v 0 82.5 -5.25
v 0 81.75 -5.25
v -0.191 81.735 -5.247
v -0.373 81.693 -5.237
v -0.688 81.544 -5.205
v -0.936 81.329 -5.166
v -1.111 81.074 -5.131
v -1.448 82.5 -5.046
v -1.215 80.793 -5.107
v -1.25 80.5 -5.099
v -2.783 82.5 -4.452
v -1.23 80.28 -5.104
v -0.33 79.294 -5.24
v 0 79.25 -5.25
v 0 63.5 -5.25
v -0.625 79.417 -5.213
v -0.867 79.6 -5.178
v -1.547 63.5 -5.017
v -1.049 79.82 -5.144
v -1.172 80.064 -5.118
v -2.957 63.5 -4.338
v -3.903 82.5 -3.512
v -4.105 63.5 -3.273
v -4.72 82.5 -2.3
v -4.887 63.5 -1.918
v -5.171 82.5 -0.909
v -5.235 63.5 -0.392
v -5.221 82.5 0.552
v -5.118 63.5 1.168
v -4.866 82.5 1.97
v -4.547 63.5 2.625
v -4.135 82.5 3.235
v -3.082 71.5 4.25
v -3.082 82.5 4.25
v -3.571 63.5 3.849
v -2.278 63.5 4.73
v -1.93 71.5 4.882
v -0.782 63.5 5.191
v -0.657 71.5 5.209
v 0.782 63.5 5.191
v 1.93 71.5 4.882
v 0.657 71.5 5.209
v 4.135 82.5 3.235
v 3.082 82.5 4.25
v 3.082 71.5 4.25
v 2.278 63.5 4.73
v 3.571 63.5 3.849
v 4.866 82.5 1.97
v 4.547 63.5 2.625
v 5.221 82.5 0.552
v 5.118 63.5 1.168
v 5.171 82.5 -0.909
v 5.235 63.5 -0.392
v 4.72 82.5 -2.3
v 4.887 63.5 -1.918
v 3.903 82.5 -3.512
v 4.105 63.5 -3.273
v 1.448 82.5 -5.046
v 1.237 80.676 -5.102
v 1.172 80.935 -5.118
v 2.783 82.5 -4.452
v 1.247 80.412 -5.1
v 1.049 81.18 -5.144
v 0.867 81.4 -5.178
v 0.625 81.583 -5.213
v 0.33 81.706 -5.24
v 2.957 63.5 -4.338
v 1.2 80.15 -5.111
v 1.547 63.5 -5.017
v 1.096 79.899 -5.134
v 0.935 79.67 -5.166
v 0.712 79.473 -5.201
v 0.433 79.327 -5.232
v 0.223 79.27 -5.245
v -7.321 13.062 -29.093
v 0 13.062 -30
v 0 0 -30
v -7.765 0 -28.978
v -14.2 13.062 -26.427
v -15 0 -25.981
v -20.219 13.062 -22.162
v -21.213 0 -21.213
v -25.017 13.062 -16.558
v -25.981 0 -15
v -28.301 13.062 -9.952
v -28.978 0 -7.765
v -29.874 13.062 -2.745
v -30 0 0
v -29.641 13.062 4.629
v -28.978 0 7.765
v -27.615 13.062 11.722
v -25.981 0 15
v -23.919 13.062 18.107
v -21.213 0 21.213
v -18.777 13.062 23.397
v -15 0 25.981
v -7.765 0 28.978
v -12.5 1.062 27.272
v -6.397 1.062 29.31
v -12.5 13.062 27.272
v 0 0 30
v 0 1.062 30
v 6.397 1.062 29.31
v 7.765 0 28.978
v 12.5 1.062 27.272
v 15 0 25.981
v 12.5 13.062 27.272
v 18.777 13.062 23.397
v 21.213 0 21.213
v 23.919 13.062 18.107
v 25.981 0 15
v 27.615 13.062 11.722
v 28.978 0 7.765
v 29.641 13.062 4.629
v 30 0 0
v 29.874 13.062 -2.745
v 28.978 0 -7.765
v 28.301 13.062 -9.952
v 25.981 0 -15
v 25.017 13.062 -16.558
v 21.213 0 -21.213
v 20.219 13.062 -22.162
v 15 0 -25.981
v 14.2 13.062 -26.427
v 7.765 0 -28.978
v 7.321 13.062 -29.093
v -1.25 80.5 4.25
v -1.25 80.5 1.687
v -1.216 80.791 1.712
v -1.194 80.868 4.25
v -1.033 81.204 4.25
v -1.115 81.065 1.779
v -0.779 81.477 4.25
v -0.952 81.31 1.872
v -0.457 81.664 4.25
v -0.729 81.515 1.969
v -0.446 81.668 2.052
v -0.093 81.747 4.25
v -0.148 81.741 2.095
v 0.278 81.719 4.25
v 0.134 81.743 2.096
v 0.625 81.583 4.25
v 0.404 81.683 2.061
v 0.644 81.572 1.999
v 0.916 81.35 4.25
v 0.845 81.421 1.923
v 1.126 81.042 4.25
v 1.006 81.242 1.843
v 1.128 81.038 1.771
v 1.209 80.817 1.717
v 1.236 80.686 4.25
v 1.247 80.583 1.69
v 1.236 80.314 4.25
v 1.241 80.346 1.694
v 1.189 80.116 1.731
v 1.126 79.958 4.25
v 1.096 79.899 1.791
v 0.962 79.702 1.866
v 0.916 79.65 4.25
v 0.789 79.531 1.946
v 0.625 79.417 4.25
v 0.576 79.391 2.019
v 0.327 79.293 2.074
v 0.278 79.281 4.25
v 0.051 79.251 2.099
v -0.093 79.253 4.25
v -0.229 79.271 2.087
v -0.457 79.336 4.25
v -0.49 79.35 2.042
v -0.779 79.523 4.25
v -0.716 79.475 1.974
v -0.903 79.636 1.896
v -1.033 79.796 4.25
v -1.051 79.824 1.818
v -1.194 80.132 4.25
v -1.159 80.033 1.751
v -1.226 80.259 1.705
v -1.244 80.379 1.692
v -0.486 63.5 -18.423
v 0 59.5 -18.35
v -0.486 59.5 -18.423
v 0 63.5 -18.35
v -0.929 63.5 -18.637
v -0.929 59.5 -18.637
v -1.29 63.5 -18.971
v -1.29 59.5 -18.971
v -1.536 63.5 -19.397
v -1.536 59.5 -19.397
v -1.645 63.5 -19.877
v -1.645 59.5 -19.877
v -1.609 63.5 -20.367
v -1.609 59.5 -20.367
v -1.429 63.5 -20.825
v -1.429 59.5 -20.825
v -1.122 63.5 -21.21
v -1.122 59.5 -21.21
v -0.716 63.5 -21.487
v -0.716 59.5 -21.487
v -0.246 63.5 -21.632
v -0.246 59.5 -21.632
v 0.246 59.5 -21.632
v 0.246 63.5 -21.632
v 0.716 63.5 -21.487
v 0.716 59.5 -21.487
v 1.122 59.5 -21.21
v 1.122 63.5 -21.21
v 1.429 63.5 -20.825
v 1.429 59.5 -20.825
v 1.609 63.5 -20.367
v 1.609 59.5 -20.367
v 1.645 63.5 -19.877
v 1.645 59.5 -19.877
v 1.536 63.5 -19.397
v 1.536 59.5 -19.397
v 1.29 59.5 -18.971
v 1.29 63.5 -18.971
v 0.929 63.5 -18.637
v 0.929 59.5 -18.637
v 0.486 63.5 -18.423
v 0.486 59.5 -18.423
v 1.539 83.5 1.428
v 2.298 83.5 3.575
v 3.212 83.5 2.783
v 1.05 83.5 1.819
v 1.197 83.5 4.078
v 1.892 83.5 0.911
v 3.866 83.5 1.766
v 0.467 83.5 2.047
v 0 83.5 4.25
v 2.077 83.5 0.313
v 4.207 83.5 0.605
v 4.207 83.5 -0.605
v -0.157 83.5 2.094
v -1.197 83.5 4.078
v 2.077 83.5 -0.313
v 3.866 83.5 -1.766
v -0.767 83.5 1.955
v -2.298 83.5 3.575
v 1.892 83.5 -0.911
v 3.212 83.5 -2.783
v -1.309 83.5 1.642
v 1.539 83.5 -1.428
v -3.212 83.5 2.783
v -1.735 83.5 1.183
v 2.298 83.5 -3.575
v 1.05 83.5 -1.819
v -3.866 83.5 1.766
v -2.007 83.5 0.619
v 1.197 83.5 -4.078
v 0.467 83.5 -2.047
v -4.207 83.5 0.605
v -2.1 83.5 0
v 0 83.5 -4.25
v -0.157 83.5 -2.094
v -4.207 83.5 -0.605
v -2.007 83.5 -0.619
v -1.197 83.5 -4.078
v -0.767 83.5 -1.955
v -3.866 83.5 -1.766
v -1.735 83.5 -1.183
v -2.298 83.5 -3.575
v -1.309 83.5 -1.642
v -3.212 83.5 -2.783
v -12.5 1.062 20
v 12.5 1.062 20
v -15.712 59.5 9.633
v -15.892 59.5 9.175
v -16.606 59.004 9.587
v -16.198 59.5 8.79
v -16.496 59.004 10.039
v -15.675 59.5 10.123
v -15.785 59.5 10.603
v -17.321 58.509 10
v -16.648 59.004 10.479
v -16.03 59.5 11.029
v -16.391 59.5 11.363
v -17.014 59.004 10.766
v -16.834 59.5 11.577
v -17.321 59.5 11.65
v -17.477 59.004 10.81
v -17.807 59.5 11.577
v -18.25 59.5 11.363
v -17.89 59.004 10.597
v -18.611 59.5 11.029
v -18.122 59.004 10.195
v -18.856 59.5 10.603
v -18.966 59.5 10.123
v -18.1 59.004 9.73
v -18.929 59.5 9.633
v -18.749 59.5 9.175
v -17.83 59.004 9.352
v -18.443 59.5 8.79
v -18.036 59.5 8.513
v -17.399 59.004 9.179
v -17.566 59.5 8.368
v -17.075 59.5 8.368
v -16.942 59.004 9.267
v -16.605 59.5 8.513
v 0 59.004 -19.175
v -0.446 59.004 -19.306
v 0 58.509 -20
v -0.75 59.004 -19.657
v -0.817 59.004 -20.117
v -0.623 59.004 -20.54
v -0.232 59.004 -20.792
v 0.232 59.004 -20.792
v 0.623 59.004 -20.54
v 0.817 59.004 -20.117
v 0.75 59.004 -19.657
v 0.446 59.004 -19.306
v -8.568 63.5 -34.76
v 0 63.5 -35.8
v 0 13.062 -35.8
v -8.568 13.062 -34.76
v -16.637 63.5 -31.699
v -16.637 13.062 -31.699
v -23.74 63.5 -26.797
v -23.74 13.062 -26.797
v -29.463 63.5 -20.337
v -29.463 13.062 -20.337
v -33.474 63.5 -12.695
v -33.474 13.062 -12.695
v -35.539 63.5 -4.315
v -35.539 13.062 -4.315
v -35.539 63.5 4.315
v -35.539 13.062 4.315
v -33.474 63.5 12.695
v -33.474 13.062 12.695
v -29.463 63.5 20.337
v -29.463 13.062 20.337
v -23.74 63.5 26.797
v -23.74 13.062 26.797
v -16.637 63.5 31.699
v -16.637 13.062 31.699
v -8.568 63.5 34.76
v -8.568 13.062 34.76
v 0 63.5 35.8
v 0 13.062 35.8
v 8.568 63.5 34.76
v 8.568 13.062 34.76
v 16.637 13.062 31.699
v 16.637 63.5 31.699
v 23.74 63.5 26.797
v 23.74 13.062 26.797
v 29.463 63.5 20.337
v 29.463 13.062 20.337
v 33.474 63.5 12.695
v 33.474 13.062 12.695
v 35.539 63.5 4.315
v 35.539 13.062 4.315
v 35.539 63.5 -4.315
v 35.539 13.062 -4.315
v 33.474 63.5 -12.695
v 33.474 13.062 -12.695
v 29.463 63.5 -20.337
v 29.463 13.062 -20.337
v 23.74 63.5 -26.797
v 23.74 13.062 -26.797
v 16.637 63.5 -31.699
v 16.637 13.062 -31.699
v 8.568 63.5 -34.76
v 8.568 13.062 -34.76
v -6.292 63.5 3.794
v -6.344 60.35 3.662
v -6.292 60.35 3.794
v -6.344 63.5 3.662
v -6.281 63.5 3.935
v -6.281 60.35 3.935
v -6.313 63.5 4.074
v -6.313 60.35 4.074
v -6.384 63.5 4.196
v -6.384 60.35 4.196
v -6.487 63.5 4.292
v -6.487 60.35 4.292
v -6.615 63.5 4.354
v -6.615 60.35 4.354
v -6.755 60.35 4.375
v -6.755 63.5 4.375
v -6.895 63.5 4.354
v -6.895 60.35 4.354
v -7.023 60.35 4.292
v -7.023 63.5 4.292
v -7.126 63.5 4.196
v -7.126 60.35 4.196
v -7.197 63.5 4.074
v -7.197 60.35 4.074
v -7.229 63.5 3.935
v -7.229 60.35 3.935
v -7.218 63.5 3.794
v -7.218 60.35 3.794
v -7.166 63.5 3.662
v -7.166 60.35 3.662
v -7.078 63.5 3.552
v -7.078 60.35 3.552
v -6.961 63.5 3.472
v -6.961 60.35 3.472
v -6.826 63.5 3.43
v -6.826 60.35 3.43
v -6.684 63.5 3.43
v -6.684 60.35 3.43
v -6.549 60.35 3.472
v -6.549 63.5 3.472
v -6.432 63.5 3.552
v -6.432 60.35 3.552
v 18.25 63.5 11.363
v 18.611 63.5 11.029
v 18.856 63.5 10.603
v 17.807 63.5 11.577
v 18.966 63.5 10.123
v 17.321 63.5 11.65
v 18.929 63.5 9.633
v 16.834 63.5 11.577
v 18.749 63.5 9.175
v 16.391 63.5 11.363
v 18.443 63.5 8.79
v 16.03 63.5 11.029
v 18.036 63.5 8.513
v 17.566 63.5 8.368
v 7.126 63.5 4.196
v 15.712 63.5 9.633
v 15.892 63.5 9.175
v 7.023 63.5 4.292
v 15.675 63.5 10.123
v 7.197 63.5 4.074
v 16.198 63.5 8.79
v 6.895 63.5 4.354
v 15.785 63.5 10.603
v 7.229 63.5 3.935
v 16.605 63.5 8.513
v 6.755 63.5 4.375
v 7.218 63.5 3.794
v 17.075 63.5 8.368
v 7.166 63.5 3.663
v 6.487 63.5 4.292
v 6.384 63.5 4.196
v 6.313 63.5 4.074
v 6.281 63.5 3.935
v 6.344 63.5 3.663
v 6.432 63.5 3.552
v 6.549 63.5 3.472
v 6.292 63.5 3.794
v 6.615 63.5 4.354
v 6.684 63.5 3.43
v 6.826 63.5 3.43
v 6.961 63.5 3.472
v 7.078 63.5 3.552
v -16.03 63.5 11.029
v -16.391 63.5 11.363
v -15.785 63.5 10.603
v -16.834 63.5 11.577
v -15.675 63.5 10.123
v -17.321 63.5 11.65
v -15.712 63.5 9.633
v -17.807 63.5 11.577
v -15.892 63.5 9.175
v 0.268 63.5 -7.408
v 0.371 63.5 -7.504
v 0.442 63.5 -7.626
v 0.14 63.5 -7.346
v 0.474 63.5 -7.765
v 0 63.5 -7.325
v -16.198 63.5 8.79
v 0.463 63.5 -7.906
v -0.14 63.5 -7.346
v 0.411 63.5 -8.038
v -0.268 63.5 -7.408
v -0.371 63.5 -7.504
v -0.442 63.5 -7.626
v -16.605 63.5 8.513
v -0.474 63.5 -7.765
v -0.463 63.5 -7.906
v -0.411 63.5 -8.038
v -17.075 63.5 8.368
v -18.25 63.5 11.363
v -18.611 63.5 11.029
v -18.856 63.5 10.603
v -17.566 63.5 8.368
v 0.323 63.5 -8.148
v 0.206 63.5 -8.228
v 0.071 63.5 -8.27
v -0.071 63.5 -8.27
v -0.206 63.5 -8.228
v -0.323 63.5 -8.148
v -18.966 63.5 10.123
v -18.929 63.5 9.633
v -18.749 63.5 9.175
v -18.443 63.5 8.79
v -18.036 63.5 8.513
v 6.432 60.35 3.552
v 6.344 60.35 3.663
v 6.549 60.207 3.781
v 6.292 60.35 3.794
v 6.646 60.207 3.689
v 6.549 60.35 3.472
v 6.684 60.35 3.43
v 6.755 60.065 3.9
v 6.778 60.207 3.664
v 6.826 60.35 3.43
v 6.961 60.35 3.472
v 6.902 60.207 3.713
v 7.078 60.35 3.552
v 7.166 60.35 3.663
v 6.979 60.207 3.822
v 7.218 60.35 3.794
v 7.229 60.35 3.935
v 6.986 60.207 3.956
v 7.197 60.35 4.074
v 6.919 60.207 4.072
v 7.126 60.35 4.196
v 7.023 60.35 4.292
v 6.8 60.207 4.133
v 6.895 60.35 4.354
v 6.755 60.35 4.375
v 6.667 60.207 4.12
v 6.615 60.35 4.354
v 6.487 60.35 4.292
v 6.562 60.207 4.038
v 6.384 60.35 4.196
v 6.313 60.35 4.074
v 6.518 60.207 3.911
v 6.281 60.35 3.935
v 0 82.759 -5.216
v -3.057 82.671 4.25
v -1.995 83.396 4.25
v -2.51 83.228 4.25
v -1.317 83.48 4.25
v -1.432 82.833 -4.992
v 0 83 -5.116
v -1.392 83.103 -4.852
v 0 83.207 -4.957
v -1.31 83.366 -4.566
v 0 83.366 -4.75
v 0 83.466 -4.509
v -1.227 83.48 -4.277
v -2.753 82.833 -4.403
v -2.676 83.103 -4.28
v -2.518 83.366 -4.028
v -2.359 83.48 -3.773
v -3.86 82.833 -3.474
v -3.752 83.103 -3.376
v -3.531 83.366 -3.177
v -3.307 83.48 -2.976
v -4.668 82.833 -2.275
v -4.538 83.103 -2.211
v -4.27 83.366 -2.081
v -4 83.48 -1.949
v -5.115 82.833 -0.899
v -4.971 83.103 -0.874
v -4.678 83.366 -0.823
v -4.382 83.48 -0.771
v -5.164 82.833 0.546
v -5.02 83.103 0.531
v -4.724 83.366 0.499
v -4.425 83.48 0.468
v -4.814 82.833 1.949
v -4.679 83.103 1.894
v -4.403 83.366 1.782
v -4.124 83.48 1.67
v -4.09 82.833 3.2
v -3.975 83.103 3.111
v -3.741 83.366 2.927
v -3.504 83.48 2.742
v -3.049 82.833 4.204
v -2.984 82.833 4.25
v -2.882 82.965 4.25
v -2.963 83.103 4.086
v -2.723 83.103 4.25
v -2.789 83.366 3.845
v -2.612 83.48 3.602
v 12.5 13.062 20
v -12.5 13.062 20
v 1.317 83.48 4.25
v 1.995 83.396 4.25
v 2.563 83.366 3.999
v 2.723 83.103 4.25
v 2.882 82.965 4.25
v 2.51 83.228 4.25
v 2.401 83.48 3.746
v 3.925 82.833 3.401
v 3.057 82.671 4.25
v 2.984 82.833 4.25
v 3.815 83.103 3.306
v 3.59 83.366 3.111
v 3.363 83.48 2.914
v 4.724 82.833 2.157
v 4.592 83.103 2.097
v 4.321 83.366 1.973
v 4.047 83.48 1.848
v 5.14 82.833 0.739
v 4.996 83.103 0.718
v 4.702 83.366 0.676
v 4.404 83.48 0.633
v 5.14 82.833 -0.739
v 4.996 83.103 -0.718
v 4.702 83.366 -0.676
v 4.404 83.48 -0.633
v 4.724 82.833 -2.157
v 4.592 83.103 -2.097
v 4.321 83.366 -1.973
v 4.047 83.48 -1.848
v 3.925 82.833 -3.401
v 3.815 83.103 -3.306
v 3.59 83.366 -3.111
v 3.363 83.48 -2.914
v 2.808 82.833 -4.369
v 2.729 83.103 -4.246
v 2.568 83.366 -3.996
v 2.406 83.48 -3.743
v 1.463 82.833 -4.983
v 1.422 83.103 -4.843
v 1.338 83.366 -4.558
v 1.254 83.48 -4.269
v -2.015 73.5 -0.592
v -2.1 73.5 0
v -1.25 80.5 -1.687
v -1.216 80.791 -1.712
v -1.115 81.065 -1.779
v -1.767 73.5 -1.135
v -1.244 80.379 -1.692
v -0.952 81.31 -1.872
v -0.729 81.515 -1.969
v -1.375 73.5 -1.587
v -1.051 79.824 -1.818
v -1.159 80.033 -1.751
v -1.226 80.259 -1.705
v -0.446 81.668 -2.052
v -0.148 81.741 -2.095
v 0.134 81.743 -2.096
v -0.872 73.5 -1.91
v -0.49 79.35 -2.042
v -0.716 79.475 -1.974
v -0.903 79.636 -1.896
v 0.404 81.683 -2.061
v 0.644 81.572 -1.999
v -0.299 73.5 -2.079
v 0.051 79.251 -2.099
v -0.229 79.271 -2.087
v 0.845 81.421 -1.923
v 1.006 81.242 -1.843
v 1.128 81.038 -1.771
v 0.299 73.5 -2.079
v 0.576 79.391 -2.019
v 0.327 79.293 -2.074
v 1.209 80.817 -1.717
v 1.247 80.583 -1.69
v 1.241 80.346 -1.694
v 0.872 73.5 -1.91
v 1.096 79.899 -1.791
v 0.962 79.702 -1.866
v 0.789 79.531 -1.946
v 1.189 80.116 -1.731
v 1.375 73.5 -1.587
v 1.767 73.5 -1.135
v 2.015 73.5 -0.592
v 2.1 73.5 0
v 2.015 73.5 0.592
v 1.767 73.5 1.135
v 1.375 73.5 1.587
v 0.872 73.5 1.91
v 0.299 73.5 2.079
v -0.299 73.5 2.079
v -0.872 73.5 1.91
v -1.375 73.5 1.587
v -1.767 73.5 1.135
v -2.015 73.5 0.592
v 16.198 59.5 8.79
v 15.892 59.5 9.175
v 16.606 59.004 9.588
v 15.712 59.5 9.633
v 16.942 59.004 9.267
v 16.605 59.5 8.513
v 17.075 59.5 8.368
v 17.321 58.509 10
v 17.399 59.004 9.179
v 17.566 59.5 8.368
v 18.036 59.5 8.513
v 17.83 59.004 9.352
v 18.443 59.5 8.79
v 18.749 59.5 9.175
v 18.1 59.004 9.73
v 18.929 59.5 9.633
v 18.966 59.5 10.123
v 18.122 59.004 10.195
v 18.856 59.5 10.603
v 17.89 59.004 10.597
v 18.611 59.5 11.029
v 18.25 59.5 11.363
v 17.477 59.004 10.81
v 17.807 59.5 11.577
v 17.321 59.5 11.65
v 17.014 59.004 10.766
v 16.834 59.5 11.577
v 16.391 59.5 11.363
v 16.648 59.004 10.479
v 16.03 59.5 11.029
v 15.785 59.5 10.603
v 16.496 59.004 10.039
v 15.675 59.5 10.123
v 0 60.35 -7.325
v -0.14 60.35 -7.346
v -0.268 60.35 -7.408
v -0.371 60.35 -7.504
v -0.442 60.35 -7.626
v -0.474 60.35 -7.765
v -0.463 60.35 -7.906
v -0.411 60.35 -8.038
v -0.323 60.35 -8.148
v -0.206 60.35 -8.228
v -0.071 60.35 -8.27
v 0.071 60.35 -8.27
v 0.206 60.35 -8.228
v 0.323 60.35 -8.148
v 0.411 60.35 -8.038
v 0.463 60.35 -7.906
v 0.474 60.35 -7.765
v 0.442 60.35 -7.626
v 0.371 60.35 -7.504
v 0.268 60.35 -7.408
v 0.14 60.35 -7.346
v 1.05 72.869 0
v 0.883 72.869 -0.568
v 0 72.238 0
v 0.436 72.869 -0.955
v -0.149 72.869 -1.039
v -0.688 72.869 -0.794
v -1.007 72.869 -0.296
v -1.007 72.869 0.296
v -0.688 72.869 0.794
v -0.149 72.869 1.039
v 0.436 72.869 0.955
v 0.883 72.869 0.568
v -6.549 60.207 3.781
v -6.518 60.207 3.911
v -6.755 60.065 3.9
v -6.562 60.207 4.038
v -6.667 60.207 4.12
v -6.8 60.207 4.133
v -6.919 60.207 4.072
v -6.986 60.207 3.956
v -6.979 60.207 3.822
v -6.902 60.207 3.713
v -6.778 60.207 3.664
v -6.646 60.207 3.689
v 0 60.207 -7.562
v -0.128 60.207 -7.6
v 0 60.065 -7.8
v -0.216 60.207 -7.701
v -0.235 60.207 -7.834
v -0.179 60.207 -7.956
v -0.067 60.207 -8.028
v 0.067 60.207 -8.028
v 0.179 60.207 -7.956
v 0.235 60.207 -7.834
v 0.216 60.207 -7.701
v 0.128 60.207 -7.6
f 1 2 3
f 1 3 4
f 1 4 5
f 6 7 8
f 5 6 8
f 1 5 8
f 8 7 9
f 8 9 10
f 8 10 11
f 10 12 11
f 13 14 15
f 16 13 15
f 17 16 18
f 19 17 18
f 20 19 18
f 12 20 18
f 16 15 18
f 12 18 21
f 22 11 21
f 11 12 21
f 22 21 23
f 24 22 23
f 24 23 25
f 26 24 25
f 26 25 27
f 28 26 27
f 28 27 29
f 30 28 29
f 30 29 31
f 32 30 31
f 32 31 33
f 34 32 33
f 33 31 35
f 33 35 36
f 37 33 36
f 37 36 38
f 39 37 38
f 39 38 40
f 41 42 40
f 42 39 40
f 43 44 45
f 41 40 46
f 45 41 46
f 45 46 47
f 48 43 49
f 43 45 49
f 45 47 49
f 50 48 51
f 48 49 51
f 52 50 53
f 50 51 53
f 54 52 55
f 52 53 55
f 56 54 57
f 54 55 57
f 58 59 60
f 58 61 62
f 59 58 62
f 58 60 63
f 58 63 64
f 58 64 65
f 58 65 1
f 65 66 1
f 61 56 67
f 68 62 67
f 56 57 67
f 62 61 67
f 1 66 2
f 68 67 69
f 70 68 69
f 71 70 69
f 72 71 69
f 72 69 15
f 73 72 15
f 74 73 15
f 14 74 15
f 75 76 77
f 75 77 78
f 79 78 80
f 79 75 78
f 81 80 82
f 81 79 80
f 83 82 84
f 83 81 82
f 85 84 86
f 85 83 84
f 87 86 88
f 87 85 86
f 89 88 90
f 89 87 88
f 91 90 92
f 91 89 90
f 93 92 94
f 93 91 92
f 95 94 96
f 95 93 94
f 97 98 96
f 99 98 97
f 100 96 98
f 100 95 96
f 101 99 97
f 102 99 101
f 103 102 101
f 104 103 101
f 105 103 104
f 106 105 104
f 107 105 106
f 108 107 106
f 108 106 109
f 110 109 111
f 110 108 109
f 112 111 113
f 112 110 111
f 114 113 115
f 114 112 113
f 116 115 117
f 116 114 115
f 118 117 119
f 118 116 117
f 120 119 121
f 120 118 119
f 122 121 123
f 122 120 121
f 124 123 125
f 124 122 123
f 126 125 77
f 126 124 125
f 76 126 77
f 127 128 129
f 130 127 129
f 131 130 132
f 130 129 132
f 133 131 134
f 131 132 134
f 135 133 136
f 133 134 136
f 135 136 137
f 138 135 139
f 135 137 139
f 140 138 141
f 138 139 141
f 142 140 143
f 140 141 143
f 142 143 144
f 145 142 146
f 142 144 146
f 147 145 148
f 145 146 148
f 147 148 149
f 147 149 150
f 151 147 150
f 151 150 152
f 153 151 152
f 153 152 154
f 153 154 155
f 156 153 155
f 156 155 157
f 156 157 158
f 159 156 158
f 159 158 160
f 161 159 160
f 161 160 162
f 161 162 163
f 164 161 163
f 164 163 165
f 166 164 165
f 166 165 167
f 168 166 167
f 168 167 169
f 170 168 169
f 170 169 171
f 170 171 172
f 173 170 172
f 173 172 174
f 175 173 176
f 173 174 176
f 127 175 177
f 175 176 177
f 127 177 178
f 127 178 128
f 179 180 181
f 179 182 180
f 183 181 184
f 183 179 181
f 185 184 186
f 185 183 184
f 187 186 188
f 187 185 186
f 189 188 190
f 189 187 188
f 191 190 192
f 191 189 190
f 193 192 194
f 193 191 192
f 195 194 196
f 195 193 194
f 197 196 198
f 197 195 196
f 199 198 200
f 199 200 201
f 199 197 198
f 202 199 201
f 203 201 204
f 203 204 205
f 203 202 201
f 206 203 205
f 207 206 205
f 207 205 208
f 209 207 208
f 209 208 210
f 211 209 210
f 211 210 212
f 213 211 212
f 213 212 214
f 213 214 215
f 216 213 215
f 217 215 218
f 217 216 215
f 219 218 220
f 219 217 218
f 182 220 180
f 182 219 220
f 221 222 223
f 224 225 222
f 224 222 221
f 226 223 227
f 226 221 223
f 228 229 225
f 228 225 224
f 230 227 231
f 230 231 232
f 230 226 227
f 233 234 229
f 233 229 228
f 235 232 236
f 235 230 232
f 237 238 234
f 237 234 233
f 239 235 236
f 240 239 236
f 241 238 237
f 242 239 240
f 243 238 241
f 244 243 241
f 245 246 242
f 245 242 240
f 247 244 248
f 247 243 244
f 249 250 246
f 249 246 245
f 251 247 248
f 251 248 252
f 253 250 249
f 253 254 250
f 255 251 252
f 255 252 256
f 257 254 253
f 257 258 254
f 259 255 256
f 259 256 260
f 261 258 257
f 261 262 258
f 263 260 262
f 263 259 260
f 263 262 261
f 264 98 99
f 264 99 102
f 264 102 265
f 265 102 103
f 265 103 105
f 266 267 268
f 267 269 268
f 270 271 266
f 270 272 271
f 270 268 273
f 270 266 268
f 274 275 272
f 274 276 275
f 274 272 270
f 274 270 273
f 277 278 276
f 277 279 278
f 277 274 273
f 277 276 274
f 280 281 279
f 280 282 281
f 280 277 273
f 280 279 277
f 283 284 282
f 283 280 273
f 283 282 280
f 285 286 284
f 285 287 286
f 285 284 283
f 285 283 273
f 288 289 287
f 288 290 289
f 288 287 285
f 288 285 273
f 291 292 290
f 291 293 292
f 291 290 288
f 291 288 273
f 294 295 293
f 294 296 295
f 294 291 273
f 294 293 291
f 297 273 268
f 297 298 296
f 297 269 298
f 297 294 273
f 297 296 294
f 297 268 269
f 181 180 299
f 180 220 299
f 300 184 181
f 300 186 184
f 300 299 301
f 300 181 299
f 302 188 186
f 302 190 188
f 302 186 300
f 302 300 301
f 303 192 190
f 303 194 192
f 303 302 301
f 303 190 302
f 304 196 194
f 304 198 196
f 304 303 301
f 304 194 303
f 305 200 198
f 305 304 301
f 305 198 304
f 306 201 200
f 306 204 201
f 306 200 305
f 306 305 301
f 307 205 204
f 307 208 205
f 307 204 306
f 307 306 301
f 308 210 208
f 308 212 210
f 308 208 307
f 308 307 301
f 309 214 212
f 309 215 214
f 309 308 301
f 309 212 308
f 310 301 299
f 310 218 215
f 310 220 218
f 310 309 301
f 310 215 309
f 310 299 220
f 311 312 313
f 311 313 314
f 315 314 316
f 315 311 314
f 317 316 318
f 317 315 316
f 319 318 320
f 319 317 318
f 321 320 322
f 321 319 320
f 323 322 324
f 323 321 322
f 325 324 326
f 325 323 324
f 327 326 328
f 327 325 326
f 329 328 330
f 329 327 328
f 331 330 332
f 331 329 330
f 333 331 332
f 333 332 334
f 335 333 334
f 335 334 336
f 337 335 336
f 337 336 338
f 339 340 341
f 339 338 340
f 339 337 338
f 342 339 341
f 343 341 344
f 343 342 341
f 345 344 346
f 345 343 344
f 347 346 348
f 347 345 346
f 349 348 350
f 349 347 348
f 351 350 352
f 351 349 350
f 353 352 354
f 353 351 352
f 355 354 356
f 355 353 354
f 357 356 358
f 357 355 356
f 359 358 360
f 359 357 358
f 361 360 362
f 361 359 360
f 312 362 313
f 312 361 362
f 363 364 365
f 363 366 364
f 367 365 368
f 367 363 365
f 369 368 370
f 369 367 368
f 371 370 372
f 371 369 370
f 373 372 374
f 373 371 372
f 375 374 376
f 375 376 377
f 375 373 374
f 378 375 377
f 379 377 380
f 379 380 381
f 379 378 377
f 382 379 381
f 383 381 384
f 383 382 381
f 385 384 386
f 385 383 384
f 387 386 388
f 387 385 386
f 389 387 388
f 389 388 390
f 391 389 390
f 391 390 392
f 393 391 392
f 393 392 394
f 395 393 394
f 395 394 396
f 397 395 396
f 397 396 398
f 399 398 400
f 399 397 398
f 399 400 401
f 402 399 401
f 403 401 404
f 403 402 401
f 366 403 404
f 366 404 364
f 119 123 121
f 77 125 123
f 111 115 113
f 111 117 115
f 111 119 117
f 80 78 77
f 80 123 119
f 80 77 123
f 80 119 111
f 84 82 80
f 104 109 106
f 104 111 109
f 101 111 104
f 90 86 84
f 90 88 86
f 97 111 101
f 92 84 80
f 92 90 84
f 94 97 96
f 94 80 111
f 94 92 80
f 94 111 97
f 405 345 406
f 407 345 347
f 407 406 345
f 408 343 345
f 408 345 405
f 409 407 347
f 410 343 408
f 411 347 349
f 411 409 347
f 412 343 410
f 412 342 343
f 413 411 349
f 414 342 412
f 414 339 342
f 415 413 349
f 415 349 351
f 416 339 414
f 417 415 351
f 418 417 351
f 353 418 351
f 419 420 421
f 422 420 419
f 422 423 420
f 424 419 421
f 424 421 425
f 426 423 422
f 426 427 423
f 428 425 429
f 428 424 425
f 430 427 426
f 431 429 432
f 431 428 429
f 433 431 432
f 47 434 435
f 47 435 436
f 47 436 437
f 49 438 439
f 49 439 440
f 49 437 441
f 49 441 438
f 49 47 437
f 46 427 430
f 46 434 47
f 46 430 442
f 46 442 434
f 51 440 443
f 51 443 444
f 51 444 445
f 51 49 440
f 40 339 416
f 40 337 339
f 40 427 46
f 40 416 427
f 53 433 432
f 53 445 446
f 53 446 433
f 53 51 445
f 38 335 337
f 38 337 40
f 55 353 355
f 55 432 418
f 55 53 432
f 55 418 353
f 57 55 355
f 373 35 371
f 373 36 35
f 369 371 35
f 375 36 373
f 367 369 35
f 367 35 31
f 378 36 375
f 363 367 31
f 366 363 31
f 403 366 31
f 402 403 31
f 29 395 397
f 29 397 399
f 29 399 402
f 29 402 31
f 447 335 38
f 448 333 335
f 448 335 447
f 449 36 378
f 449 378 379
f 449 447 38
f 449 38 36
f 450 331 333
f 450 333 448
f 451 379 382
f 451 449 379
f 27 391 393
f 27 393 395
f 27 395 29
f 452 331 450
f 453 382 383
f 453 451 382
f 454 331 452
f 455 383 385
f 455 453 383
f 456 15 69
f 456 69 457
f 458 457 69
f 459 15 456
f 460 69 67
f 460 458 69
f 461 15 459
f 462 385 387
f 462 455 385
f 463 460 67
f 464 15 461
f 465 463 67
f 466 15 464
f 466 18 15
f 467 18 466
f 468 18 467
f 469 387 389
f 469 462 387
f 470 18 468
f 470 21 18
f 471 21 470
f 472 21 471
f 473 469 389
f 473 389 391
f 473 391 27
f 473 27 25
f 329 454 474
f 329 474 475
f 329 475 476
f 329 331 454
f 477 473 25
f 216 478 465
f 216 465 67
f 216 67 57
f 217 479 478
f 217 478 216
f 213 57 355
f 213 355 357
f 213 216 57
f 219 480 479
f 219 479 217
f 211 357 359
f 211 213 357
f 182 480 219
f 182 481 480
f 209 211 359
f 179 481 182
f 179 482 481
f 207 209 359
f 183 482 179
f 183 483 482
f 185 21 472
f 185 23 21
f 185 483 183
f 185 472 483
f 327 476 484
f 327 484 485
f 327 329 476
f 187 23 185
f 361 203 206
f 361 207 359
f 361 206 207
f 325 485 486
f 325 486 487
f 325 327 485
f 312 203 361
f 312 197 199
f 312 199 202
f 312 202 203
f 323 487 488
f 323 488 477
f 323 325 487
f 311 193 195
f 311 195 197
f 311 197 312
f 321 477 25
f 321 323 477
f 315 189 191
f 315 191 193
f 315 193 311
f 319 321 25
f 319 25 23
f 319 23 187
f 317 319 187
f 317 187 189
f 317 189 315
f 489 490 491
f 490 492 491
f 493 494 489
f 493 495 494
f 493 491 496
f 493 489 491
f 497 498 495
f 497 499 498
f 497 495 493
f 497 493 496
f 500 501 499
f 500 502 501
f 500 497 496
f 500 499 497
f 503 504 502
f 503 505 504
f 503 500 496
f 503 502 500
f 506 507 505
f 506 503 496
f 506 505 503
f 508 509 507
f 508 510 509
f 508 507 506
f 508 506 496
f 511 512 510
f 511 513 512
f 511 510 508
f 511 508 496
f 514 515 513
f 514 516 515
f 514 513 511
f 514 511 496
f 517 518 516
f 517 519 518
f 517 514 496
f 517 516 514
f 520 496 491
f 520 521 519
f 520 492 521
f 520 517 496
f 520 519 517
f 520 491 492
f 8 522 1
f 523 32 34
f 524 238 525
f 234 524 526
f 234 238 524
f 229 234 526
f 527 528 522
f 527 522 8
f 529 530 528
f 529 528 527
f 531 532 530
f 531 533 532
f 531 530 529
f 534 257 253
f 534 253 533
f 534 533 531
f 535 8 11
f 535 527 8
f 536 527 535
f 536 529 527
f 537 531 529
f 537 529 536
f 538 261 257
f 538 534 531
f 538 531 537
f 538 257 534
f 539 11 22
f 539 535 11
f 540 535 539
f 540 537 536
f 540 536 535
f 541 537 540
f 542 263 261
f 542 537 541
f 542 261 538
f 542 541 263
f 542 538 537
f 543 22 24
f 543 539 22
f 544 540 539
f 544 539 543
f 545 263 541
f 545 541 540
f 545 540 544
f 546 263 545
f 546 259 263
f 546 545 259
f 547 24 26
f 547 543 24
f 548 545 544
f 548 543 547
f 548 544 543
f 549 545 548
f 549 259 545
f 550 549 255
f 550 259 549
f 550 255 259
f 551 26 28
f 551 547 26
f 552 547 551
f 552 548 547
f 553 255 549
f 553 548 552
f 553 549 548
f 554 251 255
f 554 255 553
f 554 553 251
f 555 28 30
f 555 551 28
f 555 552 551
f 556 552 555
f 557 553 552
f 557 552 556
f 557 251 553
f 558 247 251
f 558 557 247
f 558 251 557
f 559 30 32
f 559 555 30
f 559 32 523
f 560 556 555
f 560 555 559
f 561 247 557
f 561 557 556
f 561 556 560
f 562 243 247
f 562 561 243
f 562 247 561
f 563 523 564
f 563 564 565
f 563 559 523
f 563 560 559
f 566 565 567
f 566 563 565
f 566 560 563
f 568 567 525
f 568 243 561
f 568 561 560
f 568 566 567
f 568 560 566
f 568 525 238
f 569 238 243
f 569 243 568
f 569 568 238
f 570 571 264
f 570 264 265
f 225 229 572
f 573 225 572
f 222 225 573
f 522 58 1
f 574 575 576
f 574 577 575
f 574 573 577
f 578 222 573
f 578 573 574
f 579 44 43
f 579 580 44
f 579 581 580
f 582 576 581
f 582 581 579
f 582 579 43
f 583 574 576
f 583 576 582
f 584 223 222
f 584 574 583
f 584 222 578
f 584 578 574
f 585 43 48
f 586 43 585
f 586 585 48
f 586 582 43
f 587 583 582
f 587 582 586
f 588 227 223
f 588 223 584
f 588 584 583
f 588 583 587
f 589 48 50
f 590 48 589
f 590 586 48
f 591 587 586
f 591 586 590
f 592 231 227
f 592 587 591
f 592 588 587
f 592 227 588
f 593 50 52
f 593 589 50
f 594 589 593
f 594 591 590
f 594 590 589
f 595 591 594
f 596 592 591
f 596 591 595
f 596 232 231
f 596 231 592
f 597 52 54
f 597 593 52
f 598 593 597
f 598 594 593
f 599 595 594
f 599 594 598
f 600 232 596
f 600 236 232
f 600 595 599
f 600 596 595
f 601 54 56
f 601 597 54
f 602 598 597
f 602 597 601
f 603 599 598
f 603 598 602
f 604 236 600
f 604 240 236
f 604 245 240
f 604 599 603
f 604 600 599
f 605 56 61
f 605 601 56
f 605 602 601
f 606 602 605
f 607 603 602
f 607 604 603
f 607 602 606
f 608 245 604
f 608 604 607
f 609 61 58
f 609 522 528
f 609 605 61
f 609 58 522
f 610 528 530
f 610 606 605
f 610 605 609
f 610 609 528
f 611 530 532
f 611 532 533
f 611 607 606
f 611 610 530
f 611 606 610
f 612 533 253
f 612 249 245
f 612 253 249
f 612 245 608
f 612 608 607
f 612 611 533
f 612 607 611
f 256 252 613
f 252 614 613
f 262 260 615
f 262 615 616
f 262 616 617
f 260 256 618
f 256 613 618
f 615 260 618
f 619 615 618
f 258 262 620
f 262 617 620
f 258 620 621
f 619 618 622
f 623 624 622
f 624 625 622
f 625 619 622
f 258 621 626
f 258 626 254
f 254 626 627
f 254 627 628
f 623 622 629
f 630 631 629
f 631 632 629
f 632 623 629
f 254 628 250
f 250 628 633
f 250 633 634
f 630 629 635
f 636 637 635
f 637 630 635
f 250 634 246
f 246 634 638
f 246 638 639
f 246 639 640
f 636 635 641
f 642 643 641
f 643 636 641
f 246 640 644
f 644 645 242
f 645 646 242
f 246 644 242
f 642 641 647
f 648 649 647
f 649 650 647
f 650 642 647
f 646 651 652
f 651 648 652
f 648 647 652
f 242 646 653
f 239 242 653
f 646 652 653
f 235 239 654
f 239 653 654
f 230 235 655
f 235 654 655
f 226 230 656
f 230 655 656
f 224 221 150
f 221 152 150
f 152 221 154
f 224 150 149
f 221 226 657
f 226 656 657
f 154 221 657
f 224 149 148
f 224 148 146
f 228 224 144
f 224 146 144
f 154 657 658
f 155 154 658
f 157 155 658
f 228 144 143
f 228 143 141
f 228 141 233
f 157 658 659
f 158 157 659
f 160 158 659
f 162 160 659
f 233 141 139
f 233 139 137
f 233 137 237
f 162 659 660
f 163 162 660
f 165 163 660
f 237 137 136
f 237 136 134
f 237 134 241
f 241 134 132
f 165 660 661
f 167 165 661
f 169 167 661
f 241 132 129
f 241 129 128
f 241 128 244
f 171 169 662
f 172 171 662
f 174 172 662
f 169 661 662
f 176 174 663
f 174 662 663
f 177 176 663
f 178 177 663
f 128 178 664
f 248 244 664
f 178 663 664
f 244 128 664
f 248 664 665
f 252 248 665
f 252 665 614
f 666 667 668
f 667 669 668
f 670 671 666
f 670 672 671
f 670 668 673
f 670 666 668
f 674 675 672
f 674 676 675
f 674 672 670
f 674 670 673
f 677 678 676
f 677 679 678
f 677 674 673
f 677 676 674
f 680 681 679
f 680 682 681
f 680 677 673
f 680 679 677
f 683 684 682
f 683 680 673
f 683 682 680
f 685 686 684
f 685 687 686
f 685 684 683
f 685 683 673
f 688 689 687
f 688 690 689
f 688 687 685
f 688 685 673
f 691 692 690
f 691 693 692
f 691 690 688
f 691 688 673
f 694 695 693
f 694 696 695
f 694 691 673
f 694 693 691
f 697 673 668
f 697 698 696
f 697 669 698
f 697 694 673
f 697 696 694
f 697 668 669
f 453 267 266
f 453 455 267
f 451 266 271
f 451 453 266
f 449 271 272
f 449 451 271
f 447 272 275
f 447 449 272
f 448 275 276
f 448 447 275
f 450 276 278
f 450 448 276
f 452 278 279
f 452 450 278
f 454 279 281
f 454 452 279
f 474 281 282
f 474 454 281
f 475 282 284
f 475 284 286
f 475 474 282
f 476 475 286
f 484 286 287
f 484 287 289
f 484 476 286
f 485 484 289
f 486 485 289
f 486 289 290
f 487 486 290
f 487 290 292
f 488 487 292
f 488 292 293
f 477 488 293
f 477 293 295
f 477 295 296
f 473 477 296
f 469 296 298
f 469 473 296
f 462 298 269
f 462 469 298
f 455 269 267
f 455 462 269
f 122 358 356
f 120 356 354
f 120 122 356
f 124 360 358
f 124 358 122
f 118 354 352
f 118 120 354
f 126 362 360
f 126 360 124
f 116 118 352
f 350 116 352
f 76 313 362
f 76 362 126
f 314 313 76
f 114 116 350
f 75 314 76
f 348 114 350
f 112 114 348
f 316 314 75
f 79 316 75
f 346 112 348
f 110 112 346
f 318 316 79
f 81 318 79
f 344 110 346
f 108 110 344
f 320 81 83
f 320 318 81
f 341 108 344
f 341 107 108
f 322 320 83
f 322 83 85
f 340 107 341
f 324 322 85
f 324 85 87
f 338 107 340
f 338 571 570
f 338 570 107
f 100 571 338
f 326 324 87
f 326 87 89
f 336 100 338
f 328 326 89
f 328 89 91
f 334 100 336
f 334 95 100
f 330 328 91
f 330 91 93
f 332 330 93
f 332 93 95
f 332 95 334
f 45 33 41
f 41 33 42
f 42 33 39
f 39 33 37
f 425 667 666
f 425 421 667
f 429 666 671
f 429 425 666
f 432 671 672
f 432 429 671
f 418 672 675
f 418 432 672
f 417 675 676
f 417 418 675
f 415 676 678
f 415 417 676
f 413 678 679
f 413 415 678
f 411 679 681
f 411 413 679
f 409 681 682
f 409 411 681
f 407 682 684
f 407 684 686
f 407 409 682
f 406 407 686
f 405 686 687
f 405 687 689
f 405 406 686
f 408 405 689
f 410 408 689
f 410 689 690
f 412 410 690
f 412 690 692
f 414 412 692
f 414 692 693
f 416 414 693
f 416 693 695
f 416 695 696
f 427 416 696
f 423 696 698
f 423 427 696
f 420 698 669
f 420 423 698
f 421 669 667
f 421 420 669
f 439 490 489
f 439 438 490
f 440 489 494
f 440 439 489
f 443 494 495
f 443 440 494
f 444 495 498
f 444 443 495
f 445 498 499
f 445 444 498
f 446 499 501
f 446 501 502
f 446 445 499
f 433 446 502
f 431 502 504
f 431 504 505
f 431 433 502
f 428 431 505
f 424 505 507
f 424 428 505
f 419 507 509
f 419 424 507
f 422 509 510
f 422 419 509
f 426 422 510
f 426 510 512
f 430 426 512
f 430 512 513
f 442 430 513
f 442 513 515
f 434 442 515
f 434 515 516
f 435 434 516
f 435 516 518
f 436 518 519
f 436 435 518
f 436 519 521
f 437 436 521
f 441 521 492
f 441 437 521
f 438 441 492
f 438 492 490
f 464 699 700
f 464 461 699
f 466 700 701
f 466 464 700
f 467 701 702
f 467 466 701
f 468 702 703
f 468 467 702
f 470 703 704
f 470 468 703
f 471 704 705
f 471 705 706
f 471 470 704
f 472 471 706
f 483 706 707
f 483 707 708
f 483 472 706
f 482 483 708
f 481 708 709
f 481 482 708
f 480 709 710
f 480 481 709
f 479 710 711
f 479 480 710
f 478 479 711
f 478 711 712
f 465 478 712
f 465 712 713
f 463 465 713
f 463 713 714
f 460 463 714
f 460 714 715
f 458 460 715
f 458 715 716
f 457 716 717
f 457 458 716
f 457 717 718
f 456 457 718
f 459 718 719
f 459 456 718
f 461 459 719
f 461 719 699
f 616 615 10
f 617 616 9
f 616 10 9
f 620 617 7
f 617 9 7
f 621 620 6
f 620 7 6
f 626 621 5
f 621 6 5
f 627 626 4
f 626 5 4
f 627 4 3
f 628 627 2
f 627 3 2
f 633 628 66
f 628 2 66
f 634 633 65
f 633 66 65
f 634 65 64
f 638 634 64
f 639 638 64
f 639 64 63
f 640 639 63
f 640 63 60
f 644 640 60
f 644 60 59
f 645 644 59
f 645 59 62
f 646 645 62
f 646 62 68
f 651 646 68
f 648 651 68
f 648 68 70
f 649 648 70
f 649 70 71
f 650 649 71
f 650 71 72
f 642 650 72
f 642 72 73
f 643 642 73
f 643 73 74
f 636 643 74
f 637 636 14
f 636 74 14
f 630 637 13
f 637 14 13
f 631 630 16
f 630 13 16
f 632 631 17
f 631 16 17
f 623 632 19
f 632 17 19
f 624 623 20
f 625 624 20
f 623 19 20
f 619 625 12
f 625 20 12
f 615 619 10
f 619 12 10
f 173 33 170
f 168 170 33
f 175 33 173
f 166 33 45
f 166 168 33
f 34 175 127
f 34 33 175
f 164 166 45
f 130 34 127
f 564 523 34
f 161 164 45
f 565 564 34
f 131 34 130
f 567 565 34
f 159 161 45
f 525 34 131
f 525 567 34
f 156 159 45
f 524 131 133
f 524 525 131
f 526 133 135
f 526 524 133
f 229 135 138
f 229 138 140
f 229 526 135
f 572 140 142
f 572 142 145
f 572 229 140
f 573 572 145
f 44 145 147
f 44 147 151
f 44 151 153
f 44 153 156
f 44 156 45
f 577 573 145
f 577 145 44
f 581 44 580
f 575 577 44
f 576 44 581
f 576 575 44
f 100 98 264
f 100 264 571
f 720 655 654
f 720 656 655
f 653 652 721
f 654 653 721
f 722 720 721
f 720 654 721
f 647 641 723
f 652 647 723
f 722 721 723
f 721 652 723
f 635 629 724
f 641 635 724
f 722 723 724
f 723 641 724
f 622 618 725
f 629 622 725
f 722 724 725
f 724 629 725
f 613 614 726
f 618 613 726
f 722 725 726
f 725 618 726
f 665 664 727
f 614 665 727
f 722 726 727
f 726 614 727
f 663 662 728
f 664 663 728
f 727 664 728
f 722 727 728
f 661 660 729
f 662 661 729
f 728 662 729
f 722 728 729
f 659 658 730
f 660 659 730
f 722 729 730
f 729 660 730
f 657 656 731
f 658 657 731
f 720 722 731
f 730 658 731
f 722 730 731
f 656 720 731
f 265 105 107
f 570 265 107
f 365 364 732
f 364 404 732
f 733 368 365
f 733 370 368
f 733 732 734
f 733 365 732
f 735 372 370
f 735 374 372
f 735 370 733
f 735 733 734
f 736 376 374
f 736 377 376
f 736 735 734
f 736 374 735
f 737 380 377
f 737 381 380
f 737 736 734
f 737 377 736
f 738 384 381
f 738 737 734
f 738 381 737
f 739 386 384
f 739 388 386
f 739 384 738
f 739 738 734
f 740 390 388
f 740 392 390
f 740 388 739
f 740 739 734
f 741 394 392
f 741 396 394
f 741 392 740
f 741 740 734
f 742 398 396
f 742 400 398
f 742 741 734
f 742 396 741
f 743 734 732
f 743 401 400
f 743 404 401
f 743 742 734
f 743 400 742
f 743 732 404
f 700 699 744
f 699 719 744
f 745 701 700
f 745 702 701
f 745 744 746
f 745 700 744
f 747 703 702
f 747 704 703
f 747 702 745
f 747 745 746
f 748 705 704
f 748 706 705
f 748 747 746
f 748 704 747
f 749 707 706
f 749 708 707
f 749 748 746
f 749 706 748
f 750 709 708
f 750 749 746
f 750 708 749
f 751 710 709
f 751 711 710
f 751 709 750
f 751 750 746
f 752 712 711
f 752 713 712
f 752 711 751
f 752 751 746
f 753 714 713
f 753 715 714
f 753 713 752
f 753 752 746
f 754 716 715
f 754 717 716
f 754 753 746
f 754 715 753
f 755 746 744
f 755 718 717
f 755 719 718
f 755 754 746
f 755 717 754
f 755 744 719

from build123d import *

# Parameters (mm, degrees)
SKETCH_2_R               = 5.25
EXTRUDE_1_DEPTH          = 20
PATTERN_CIRCULAR_1_COUNT = 3
SKETCH_7_W               = 25
SKETCH_7_H               = 12
CUT_EXTRUDE_1_DEPTH      = 20
FILLET_1_R               = 1
SKETCH_9_W               = 7.609655
SKETCH_9_H               = 12
CUT_EXTRUDE_2_DEPTH      = 20
HOLE_WIZARD_M3_1_D       = 2.5
HOLE_WIZARD_M5_1_D       = 4.2
HOLE_WIZARD_M5_1_DEPTH   = 10
HOLE_WIZARD_M5_1_TIP     = 1.2618073


with BuildPart() as part:
    # 草图1 → 旋转1 (revolve)
    with BuildSketch(Plane(origin=(0, 0, 0), x_dir=(0, 0, -1), z_dir=(1, 0, 0)), mode=Mode.PRIVATE) as revolve_1_sk:
        Polygon((0, 0), (-30, 0), (-30, 13.061610641), (-35.8, 13.061610641), (-35.8, 63.5), (0, 63.5), align=None)
    revolve(revolve_1_sk.sketch.rotate(Axis((0, 0, 0), (0, 1, 0)), 180), axis=Axis((0, 0, 0), (0, 1, 0)))

    # 草图2 → 凸台-拉伸1 (add)
    with BuildSketch(Plane(origin=(0, 63.5, 0), x_dir=(1, 0, 0), z_dir=(0, 1, 0))):
        with Locations(Location((0, 0, 0), (0, 0, 90))):
            Circle(SKETCH_2_R)
    extrude(amount=EXTRUDE_1_DEPTH)

    # 草图3 → M4 螺纹孔1 (revolve, cut)
    with BuildSketch(Plane(origin=(0, 63.5, -20), x_dir=(0, 0, 1), z_dir=(1, 0, 0))):
        Polygon((0, 0), (0, 4.991420021), (1.65, 4), (1.65, 0), align=None)
    hole_wizard_m4_1 = revolve(axis=Axis((0, 69.85, -20), (0, -1, 0)), mode=Mode.SUBTRACT)

    # 草图5 → M1.2x0.25 螺纹孔1 (revolve, cut)
    with BuildSketch(Plane(origin=(0, 63.5, -7.8), x_dir=(0, 0, 1), z_dir=(1, 0, 0))):
        Polygon((0, 0), (0, 3.435408794), (0.475, 3.15), (0.475, 0), align=None)
    m1_2x0_25_1 = revolve(axis=Axis((0, 69.85, -7.8), (0, -1, 0)), mode=Mode.SUBTRACT)

    # 阵列(圆周)1: M4 螺纹孔1, M1.2x0.25 螺纹孔1 ×3 about axis
    pattern_circular_1_axis = Axis((0, 0, 0), (0, 1, 0))
    add([hole_wizard_m4_1.rotate(pattern_circular_1_axis, i * 360 / PATTERN_CIRCULAR_1_COUNT) for i in range(1, PATTERN_CIRCULAR_1_COUNT)], mode=Mode.SUBTRACT)
    add([m1_2x0_25_1.rotate(pattern_circular_1_axis, i * 360 / PATTERN_CIRCULAR_1_COUNT) for i in range(1, PATTERN_CIRCULAR_1_COUNT)], mode=Mode.SUBTRACT)

    # 草图7 → 切除-拉伸1 (cut)
    with BuildSketch(Plane.XY.offset(40)):
        with Locations((0, 7.061610641)):
            Rectangle(SKETCH_7_W, SKETCH_7_H)
    extrude(amount=-CUT_EXTRUDE_1_DEPTH, mode=Mode.SUBTRACT)

    # 圆角1
    fillet_1_edges = [part.edges().sort_by_distance(p)[0] for p in [
        (0, 83.5, 5.25),
    ]]
    fillet(fillet_1_edges, radius=FILLET_1_R)

    # 草图9 → 切除-拉伸2 (cut)
    with BuildSketch(Plane.XY.offset(4.25)):
        with Locations((0, 77.5)):
            Rectangle(SKETCH_9_W, SKETCH_9_H)
    extrude(amount=CUT_EXTRUDE_2_DEPTH, mode=Mode.SUBTRACT)

    # M3 螺纹孔1 (through all)
    with Locations(Plane.XY.offset(4.25)):
        with Locations((0, 80.5)):
            Hole(HOLE_WIZARD_M3_1_D / 2)

    # M5 螺纹孔1
    with Locations(Plane(origin=(0, 83.5, 0), x_dir=(1, 0, 0), z_dir=(0, 1, 0))):
        with Locations((0, 0)):
            Hole(HOLE_WIZARD_M5_1_D / 2, depth=HOLE_WIZARD_M5_1_DEPTH)
            with Locations((0, 0, -(HOLE_WIZARD_M5_1_DEPTH + HOLE_WIZARD_M5_1_TIP / 2))):  # 118° drill point
                Cone(0, HOLE_WIZARD_M5_1_D / 2, HOLE_WIZARD_M5_1_TIP, mode=Mode.SUBTRACT)


solid = part.part
